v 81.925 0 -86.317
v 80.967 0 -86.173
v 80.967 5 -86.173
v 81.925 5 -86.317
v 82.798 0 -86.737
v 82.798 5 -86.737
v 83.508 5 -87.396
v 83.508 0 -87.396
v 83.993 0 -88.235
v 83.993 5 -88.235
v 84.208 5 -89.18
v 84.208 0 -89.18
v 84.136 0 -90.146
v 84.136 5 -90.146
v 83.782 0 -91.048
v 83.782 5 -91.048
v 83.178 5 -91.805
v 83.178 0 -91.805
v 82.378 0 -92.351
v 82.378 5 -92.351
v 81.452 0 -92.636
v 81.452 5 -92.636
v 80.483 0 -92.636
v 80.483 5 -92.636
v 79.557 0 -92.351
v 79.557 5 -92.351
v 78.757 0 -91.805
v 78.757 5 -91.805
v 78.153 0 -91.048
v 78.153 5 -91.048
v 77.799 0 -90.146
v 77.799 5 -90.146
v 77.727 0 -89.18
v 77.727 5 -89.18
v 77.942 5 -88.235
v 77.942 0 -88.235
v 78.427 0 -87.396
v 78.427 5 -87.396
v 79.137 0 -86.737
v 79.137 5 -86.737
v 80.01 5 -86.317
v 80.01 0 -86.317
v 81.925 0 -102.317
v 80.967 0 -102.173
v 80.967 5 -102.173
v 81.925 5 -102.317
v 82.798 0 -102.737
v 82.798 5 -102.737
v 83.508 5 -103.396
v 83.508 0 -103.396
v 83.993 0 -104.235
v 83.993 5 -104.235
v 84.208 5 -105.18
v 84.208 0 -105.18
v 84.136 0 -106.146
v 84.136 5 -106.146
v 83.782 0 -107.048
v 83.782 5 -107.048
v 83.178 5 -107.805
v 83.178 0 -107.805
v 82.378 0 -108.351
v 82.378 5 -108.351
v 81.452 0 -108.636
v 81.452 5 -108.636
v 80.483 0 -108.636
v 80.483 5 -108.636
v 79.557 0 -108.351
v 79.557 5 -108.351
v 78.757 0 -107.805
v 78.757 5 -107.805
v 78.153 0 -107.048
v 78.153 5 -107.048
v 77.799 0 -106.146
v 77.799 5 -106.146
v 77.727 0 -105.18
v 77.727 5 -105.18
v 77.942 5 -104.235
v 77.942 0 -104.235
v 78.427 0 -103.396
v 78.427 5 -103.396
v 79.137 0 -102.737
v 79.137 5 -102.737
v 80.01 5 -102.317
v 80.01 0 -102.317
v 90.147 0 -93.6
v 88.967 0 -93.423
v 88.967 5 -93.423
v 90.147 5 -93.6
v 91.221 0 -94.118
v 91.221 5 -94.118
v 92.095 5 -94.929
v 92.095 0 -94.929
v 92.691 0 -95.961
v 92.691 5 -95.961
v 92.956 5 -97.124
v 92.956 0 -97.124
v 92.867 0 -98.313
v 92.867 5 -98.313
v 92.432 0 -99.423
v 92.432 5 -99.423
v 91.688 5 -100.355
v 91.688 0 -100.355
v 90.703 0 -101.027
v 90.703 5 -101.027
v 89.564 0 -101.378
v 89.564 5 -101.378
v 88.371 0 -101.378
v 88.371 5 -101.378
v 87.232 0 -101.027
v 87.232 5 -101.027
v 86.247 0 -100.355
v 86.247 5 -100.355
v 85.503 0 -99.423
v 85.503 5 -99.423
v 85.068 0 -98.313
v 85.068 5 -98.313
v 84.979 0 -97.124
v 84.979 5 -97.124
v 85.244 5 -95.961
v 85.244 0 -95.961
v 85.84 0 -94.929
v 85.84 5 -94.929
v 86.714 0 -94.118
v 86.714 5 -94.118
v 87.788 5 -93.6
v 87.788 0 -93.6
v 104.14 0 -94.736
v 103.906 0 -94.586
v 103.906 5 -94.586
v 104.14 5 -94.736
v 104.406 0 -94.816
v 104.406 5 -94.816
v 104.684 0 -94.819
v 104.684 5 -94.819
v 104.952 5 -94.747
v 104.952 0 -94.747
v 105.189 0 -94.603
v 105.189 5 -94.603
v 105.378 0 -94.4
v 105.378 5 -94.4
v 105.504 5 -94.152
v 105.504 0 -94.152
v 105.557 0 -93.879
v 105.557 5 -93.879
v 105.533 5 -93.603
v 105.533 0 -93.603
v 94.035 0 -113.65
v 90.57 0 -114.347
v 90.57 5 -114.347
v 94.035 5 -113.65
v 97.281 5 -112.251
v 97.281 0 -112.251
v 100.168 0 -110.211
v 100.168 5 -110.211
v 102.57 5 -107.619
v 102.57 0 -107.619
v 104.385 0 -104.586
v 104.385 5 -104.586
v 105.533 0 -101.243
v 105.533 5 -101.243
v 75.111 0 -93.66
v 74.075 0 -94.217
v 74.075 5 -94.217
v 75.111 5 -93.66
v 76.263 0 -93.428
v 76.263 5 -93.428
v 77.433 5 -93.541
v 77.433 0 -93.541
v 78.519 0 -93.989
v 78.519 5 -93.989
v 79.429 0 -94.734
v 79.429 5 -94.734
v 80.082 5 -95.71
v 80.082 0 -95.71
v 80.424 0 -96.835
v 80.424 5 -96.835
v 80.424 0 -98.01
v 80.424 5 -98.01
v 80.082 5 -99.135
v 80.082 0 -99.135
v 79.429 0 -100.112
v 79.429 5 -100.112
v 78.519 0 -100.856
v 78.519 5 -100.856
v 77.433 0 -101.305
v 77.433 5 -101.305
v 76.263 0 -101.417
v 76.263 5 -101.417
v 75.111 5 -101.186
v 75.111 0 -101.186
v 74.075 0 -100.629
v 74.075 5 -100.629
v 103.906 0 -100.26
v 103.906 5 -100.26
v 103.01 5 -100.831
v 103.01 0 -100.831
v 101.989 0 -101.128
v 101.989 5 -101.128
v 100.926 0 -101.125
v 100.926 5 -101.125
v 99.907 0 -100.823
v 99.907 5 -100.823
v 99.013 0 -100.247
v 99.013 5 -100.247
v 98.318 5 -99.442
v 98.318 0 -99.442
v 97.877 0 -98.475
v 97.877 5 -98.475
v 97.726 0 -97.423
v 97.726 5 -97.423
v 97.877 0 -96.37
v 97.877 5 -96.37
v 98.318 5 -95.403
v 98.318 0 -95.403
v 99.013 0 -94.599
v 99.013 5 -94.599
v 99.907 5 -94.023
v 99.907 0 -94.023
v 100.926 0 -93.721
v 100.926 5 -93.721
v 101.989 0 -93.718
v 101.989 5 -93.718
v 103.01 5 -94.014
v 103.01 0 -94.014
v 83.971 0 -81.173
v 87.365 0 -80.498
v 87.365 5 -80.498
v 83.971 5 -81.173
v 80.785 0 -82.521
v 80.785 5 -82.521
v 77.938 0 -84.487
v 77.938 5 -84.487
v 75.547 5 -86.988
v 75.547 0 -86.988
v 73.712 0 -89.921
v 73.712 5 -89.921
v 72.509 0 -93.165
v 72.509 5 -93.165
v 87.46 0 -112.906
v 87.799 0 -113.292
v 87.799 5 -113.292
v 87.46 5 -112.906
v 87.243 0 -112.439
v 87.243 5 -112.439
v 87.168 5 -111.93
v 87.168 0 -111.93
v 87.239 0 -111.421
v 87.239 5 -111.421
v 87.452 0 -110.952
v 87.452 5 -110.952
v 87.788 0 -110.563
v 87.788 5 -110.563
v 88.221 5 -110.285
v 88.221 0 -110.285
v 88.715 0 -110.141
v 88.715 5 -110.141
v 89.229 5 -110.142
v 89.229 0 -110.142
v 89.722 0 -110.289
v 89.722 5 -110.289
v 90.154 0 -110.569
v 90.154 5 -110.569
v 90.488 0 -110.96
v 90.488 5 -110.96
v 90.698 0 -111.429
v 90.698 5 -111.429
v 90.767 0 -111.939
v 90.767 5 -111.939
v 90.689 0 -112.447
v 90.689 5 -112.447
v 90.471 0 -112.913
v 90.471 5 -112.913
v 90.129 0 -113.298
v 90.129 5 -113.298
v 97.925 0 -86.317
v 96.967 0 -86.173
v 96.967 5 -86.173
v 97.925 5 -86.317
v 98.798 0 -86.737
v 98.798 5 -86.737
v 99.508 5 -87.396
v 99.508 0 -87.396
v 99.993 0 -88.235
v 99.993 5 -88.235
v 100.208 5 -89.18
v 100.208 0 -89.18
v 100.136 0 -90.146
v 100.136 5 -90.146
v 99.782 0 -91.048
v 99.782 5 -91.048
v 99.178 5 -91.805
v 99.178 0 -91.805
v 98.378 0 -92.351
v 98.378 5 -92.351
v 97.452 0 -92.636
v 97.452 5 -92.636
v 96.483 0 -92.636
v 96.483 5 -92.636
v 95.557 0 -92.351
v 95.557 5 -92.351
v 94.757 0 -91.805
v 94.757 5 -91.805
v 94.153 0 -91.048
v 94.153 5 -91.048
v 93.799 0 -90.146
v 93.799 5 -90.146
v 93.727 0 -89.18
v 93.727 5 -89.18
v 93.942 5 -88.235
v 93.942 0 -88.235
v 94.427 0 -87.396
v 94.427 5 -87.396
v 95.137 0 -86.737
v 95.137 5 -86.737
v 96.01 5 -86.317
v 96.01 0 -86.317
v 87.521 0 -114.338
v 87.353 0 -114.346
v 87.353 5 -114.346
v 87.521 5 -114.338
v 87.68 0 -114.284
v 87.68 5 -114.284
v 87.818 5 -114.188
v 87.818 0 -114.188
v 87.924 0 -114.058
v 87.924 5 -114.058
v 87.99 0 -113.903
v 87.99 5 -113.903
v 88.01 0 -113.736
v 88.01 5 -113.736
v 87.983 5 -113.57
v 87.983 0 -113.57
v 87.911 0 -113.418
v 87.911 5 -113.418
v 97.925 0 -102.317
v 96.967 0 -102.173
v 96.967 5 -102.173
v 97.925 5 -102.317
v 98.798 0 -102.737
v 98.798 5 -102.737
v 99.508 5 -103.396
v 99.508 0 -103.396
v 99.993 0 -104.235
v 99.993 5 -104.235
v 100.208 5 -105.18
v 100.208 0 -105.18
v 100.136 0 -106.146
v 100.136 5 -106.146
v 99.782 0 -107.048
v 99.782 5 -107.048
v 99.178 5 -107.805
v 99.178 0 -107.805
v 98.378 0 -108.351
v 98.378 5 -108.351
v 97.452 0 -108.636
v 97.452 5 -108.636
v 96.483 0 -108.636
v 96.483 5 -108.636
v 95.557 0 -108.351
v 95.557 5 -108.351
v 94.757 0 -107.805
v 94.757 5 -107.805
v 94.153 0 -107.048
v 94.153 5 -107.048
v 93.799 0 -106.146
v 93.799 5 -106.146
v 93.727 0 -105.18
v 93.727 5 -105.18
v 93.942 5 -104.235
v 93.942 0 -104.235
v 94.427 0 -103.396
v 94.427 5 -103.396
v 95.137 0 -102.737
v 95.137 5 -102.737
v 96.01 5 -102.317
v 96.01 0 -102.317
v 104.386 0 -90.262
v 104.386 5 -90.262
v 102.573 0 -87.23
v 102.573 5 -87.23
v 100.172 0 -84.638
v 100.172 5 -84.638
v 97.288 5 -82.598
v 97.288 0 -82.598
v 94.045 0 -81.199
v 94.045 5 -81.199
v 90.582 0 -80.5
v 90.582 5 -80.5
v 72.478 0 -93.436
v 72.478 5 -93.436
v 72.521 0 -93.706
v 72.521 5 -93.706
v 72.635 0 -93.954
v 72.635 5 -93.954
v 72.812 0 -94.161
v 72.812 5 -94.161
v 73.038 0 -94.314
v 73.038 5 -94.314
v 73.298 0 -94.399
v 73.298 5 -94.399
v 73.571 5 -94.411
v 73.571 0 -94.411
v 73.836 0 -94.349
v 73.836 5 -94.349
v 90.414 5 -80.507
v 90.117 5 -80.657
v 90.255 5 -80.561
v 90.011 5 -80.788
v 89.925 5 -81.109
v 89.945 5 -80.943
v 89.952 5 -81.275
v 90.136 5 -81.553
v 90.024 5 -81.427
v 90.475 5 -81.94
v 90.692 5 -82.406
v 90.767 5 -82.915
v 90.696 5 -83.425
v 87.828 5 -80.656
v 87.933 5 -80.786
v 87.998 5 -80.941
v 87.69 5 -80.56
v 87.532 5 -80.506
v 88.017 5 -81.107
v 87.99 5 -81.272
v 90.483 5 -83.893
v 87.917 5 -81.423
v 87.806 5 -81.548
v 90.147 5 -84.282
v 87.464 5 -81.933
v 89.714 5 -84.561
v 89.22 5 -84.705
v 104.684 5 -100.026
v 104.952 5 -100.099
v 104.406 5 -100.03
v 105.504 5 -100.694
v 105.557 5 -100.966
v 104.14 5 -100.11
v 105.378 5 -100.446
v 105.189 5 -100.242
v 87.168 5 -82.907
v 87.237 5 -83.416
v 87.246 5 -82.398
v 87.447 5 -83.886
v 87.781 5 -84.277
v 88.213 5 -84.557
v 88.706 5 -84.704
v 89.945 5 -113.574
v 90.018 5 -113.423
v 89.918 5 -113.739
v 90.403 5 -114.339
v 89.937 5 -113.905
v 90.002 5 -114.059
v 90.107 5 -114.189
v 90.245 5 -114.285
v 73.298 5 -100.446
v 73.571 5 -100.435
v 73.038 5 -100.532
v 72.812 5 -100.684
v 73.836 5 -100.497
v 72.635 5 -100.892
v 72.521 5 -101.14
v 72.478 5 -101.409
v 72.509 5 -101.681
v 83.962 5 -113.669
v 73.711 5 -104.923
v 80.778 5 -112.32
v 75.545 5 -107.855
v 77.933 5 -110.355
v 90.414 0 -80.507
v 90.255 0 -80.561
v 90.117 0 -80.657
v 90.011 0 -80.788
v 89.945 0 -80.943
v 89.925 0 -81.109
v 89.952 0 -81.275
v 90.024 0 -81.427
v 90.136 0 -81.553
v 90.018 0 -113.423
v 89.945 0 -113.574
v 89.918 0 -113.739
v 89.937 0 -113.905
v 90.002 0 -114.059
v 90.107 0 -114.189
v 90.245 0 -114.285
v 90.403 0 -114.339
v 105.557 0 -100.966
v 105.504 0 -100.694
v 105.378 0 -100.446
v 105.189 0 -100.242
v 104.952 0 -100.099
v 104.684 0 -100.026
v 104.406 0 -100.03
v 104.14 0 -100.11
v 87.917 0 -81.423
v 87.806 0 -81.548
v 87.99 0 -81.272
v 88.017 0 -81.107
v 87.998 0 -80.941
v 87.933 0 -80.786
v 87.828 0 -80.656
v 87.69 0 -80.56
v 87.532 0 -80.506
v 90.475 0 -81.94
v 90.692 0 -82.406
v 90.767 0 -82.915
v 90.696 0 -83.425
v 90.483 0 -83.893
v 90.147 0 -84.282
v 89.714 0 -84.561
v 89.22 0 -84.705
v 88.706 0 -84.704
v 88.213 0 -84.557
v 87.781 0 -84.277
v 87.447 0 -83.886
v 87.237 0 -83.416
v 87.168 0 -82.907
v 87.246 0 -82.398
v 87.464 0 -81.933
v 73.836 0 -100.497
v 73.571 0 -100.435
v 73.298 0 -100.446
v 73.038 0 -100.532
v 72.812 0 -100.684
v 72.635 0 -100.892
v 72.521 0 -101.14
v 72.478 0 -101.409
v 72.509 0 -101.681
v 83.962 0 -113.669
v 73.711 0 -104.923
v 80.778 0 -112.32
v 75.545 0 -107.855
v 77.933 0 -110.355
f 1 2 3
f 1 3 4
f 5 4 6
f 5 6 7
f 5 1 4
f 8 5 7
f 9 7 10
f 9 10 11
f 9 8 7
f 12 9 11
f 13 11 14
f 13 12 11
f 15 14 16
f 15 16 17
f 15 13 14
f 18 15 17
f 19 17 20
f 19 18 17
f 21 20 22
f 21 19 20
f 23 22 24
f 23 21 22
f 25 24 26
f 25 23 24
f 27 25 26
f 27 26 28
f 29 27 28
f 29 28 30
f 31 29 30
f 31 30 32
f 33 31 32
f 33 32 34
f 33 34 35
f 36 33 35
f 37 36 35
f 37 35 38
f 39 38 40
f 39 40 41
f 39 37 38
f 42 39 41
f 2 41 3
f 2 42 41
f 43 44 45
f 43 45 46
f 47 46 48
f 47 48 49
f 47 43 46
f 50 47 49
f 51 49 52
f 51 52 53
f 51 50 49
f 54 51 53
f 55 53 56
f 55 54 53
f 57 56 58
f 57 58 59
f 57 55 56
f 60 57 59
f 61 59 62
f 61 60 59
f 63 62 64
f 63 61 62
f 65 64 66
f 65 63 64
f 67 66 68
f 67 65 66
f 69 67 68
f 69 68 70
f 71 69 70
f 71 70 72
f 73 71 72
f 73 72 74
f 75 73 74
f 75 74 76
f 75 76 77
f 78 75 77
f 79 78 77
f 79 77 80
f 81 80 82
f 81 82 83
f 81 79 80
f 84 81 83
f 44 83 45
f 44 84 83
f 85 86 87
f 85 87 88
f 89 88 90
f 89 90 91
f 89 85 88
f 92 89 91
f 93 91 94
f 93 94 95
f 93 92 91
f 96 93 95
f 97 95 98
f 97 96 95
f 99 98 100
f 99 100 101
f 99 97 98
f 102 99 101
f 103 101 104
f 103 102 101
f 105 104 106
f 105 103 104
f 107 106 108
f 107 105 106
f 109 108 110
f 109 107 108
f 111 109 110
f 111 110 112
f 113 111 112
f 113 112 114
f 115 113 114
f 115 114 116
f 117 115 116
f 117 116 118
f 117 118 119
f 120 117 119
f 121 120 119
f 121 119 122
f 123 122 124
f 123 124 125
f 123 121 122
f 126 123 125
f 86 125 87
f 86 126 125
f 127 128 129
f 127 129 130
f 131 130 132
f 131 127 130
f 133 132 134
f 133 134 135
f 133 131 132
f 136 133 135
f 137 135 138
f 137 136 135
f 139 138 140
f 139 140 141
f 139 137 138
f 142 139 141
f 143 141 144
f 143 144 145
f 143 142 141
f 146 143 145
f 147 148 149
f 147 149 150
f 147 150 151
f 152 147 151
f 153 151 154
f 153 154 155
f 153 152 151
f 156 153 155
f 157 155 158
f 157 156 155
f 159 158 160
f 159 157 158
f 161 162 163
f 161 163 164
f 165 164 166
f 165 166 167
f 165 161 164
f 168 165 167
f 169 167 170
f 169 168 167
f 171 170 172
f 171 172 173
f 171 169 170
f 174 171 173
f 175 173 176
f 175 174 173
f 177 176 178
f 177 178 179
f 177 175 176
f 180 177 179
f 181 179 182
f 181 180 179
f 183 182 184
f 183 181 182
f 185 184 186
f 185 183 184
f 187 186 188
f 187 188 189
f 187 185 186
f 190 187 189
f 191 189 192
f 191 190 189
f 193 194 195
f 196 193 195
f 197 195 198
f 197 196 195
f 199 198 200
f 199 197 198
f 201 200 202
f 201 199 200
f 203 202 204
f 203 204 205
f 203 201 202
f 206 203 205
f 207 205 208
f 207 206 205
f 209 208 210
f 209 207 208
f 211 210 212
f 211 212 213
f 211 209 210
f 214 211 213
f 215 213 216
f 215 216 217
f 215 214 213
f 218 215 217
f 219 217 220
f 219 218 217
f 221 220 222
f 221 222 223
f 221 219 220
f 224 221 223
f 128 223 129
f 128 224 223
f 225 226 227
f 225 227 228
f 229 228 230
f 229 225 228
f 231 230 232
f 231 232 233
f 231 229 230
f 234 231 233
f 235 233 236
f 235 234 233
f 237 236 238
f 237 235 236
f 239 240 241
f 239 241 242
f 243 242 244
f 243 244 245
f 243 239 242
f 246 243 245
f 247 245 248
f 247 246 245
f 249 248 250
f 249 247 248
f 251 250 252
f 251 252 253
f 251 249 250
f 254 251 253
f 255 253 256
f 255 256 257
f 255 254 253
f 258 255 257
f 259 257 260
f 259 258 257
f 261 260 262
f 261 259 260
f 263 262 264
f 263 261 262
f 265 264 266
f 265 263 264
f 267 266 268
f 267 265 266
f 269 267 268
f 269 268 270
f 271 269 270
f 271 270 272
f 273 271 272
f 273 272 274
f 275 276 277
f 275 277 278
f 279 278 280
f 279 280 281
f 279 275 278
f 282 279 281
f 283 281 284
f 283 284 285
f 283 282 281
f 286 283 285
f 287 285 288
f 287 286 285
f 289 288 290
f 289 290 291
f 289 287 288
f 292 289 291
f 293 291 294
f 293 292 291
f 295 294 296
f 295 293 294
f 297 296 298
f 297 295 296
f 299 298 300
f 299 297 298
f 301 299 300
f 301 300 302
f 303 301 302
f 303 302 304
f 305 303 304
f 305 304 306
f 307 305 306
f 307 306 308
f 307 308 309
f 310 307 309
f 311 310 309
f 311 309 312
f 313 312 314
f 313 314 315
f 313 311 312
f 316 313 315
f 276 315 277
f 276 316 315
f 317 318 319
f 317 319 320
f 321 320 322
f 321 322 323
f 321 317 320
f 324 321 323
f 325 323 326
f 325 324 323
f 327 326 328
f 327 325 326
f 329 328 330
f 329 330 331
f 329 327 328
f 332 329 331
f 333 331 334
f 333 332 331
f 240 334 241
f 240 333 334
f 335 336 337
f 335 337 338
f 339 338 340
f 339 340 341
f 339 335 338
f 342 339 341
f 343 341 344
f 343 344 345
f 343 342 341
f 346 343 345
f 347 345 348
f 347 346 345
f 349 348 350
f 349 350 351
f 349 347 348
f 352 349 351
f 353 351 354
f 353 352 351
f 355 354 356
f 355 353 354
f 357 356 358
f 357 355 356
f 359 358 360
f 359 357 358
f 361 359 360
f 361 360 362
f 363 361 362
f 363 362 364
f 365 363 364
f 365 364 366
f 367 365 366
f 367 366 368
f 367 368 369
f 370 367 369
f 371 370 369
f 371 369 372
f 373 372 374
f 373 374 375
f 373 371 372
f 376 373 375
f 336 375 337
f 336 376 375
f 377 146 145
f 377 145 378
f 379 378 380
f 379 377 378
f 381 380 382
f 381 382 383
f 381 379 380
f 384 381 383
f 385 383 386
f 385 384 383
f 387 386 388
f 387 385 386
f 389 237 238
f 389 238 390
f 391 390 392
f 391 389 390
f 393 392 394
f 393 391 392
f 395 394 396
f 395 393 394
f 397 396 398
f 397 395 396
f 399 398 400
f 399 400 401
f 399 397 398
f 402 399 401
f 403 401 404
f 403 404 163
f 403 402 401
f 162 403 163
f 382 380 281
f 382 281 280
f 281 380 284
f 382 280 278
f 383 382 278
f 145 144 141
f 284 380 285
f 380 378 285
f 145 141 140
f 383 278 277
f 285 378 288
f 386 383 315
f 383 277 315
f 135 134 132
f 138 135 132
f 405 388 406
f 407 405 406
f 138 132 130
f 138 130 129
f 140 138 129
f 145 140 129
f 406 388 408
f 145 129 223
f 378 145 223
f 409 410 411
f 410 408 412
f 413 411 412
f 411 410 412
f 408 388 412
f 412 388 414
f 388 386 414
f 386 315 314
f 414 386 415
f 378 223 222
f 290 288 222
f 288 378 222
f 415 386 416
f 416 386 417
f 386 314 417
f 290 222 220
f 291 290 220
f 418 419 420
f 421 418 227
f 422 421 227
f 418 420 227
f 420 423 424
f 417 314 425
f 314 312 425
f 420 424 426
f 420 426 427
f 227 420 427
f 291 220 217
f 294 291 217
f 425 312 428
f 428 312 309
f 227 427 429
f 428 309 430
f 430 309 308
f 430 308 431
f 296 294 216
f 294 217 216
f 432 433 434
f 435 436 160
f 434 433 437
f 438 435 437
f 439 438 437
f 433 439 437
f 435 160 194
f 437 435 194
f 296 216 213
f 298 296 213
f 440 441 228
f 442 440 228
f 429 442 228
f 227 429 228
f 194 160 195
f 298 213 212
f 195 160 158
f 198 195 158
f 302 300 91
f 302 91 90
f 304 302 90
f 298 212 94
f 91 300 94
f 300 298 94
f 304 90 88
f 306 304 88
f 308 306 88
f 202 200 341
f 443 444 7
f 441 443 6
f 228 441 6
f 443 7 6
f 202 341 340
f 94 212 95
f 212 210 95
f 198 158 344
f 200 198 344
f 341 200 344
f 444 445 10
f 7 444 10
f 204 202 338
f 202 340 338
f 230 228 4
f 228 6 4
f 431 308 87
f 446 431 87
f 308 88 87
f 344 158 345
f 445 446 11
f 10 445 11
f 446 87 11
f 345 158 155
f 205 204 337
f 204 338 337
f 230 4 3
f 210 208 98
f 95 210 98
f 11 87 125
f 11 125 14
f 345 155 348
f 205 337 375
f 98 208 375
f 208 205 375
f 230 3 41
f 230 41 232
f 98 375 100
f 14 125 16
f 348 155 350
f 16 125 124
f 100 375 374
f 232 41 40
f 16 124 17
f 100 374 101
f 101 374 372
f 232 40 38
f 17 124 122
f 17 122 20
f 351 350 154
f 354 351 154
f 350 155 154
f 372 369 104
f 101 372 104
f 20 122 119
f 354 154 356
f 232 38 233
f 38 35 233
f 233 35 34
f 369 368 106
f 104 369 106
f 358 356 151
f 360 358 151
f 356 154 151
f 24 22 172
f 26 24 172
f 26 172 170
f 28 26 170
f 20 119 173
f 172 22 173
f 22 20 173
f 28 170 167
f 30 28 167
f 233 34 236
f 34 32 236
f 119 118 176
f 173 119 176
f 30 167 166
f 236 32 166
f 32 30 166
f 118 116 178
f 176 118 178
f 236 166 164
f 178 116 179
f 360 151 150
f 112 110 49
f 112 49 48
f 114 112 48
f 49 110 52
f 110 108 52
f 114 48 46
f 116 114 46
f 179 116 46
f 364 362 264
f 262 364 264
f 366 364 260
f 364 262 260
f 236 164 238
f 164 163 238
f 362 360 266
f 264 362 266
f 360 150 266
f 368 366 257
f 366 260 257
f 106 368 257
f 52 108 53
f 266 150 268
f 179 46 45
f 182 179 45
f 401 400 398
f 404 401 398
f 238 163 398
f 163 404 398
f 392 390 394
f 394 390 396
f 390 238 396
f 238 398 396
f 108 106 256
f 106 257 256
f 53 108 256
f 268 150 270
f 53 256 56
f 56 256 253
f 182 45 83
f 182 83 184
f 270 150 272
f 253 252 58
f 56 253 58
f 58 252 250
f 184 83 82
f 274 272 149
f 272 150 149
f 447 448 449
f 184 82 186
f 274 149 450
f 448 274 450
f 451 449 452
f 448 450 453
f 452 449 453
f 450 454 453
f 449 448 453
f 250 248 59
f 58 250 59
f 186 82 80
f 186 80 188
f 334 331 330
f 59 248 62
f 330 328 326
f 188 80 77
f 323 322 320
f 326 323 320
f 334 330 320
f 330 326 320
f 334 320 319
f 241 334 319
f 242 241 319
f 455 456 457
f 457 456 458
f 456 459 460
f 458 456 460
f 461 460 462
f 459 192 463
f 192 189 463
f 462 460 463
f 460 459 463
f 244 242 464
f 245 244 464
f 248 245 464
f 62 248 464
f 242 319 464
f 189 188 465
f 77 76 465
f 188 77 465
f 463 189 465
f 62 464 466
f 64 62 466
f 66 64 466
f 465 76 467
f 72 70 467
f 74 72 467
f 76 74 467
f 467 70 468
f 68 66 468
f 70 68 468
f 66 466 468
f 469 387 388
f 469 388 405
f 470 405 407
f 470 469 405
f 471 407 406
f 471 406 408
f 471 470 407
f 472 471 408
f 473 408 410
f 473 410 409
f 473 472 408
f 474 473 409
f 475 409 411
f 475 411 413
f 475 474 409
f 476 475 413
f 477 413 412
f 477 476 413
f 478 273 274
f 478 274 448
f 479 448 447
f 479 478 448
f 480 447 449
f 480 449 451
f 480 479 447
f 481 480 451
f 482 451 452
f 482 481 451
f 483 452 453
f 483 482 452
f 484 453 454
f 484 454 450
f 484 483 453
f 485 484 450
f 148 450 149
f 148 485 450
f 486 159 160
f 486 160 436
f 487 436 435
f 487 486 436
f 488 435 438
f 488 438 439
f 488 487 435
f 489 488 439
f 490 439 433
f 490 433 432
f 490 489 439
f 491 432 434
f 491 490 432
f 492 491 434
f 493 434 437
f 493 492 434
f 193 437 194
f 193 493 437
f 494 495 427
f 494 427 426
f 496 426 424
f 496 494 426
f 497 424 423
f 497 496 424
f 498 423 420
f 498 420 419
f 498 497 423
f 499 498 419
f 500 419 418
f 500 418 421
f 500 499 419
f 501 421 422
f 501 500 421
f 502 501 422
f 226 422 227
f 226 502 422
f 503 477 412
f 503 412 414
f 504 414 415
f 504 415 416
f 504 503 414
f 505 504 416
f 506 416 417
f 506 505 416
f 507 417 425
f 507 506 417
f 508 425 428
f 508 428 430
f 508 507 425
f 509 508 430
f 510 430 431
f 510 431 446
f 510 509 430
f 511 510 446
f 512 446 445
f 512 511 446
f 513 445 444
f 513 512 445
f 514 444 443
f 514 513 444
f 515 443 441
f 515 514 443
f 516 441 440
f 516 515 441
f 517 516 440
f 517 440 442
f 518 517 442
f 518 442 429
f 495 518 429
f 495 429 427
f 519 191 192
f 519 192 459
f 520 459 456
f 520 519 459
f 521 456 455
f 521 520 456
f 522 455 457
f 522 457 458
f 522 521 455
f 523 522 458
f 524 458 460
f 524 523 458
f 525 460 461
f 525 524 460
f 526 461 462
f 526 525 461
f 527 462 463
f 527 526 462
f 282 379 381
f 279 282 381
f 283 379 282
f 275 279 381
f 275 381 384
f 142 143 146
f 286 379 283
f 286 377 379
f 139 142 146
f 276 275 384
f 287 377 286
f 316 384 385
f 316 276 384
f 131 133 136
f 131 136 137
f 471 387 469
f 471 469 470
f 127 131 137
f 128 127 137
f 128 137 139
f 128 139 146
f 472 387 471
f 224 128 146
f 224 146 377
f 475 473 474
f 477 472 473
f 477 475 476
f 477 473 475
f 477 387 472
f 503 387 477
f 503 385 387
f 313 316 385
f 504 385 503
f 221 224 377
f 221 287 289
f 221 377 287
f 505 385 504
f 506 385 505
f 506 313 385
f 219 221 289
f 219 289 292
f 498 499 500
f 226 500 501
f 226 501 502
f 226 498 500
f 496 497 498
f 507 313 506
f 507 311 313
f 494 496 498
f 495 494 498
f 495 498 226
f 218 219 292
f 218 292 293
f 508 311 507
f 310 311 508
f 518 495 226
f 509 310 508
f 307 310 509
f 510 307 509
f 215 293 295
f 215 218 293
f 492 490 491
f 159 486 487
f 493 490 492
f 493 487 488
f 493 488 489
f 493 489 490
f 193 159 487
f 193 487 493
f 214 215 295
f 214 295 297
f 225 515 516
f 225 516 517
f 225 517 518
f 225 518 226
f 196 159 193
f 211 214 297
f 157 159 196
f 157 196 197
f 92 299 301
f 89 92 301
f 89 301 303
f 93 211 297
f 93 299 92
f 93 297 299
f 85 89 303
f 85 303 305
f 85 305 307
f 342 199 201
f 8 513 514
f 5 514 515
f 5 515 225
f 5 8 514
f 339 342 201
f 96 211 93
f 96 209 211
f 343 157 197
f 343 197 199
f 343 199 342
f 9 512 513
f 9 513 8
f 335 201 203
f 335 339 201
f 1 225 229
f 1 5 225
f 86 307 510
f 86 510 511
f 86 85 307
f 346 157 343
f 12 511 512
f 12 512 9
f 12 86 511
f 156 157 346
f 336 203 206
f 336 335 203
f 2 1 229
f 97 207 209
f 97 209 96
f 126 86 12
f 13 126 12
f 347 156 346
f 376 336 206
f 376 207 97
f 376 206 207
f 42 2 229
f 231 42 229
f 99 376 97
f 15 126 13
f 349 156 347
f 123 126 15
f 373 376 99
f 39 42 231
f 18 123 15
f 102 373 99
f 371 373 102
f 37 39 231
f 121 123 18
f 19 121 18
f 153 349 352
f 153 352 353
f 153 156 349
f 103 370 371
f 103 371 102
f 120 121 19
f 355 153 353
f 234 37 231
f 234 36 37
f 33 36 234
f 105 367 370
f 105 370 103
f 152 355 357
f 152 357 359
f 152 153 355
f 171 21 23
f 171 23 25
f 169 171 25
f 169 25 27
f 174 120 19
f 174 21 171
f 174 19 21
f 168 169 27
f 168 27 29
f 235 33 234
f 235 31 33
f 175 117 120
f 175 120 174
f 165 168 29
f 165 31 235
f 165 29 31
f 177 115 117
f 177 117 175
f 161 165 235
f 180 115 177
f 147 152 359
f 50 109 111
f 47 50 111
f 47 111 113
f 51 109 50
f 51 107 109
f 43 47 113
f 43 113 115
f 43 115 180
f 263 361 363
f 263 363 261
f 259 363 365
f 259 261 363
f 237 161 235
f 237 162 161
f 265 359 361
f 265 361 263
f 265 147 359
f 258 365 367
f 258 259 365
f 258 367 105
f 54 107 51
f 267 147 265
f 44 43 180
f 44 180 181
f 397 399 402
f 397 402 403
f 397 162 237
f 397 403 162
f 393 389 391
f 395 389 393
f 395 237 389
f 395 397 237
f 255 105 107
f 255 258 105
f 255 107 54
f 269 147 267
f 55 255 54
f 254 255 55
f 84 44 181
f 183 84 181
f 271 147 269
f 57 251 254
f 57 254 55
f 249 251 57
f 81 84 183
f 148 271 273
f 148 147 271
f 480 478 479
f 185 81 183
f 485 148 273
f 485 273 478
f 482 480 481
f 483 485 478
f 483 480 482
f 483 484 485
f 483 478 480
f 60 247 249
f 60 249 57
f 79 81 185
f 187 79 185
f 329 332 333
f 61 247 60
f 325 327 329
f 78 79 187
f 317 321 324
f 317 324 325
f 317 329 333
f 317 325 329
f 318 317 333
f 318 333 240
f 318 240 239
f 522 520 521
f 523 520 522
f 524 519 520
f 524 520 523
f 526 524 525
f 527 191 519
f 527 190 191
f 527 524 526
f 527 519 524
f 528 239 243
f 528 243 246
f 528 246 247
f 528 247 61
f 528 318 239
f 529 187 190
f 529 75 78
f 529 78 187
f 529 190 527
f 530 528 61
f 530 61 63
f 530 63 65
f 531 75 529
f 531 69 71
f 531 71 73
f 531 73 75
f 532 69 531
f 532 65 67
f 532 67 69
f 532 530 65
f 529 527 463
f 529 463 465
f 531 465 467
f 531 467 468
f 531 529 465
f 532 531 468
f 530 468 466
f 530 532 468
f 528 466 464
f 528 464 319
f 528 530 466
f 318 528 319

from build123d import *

# Parameters (mm, degrees)
SKETCH2_R           = 3.25
SKETCH2_R_2         = 4
BOSS_EXTRUDE1_DEPTH = 5


with BuildPart() as part:
    # Sketch2 → Boss-Extrude1 (new body)
    with BuildSketch(Plane(origin=(0, 0, 0), x_dir=(1, 0, 0), z_dir=(0, 1, 0))):
        with BuildLine():
            ThreePointArc((74.0754883, 100.6287171), (72.919899742, 100.600095739), (72.5093633, 101.680680732))
            ThreePointArc((72.5093633, 101.680680732), (77.933093033, 110.354945232), (87.35286635, 114.345882401))
            ThreePointArc((87.35286635, 114.345882401), (87.962324772, 113.982635249), (87.79926183, 113.292129247))
            ThreePointArc((87.79926183, 113.292129247), (88.97179336, 110.122737844), (90.12915105, 113.29770166))
            ThreePointArc((90.12915105, 113.29770166), (89.96425768, 113.984397711), (90.570273688, 114.34700754))
            ThreePointArc((90.570273688, 114.34700754), (100.167880321, 110.211447196), (105.532711055, 101.242862936))
            ThreePointArc((105.532711055, 101.242862936), (105.075581876, 100.162342656), (103.906399753, 100.259832785))
            ThreePointArc((103.906399753, 100.259832785), (97.726174894, 97.422732696), (103.906399753, 94.585632606))
            ThreePointArc((103.906399753, 94.585632606), (105.075581876, 94.683122735), (105.532711055, 93.602602455))
            ThreePointArc((105.532711055, 93.602602455), (100.172351893, 84.637935793), (90.582110249, 80.49958299))
            ThreePointArc((90.582110249, 80.49958299), (89.972651827, 80.862830142), (90.135714769, 81.553336144))
            ThreePointArc((90.135714769, 81.553336144), (88.963183239, 84.722727547), (87.805825549, 81.547763731))
            ThreePointArc((87.805825549, 81.547763731), (87.97071892, 80.86106768), (87.364702911, 80.498457852))
            ThreePointArc((87.364702911, 80.498457852), (77.937616147, 84.486662184), (72.5093633, 93.164784659))
            ThreePointArc((72.5093633, 93.164784659), (72.919899742, 94.245369652), (74.0754883, 94.216748291))
            ThreePointArc((74.0754883, 94.216748291), (80.4674883, 97.422732696), (74.0754883, 100.6287171))
        make_face()
        with Locations(Location((80.9674883, 89.422732696, 0), (0, 0, 270))):
            Circle(SKETCH2_R, mode=Mode.SUBTRACT)
        with Locations(Location((88.9674883, 97.422732696, 0), (0, 0, 270))):
            Circle(SKETCH2_R_2, mode=Mode.SUBTRACT)
        with Locations(Location((80.9674883, 105.422732696, 0), (0, 0, 270))):
            Circle(SKETCH2_R, mode=Mode.SUBTRACT)
        with Locations(Location((96.9674883, 105.422732696, 0), (0, 0, 270))):
            Circle(SKETCH2_R, mode=Mode.SUBTRACT)
        with Locations(Location((96.9674883, 89.422732696, 0), (0, 0, 270))):
            Circle(SKETCH2_R, mode=Mode.SUBTRACT)
    extrude(amount=BOSS_EXTRUDE1_DEPTH)


solid = part.part
